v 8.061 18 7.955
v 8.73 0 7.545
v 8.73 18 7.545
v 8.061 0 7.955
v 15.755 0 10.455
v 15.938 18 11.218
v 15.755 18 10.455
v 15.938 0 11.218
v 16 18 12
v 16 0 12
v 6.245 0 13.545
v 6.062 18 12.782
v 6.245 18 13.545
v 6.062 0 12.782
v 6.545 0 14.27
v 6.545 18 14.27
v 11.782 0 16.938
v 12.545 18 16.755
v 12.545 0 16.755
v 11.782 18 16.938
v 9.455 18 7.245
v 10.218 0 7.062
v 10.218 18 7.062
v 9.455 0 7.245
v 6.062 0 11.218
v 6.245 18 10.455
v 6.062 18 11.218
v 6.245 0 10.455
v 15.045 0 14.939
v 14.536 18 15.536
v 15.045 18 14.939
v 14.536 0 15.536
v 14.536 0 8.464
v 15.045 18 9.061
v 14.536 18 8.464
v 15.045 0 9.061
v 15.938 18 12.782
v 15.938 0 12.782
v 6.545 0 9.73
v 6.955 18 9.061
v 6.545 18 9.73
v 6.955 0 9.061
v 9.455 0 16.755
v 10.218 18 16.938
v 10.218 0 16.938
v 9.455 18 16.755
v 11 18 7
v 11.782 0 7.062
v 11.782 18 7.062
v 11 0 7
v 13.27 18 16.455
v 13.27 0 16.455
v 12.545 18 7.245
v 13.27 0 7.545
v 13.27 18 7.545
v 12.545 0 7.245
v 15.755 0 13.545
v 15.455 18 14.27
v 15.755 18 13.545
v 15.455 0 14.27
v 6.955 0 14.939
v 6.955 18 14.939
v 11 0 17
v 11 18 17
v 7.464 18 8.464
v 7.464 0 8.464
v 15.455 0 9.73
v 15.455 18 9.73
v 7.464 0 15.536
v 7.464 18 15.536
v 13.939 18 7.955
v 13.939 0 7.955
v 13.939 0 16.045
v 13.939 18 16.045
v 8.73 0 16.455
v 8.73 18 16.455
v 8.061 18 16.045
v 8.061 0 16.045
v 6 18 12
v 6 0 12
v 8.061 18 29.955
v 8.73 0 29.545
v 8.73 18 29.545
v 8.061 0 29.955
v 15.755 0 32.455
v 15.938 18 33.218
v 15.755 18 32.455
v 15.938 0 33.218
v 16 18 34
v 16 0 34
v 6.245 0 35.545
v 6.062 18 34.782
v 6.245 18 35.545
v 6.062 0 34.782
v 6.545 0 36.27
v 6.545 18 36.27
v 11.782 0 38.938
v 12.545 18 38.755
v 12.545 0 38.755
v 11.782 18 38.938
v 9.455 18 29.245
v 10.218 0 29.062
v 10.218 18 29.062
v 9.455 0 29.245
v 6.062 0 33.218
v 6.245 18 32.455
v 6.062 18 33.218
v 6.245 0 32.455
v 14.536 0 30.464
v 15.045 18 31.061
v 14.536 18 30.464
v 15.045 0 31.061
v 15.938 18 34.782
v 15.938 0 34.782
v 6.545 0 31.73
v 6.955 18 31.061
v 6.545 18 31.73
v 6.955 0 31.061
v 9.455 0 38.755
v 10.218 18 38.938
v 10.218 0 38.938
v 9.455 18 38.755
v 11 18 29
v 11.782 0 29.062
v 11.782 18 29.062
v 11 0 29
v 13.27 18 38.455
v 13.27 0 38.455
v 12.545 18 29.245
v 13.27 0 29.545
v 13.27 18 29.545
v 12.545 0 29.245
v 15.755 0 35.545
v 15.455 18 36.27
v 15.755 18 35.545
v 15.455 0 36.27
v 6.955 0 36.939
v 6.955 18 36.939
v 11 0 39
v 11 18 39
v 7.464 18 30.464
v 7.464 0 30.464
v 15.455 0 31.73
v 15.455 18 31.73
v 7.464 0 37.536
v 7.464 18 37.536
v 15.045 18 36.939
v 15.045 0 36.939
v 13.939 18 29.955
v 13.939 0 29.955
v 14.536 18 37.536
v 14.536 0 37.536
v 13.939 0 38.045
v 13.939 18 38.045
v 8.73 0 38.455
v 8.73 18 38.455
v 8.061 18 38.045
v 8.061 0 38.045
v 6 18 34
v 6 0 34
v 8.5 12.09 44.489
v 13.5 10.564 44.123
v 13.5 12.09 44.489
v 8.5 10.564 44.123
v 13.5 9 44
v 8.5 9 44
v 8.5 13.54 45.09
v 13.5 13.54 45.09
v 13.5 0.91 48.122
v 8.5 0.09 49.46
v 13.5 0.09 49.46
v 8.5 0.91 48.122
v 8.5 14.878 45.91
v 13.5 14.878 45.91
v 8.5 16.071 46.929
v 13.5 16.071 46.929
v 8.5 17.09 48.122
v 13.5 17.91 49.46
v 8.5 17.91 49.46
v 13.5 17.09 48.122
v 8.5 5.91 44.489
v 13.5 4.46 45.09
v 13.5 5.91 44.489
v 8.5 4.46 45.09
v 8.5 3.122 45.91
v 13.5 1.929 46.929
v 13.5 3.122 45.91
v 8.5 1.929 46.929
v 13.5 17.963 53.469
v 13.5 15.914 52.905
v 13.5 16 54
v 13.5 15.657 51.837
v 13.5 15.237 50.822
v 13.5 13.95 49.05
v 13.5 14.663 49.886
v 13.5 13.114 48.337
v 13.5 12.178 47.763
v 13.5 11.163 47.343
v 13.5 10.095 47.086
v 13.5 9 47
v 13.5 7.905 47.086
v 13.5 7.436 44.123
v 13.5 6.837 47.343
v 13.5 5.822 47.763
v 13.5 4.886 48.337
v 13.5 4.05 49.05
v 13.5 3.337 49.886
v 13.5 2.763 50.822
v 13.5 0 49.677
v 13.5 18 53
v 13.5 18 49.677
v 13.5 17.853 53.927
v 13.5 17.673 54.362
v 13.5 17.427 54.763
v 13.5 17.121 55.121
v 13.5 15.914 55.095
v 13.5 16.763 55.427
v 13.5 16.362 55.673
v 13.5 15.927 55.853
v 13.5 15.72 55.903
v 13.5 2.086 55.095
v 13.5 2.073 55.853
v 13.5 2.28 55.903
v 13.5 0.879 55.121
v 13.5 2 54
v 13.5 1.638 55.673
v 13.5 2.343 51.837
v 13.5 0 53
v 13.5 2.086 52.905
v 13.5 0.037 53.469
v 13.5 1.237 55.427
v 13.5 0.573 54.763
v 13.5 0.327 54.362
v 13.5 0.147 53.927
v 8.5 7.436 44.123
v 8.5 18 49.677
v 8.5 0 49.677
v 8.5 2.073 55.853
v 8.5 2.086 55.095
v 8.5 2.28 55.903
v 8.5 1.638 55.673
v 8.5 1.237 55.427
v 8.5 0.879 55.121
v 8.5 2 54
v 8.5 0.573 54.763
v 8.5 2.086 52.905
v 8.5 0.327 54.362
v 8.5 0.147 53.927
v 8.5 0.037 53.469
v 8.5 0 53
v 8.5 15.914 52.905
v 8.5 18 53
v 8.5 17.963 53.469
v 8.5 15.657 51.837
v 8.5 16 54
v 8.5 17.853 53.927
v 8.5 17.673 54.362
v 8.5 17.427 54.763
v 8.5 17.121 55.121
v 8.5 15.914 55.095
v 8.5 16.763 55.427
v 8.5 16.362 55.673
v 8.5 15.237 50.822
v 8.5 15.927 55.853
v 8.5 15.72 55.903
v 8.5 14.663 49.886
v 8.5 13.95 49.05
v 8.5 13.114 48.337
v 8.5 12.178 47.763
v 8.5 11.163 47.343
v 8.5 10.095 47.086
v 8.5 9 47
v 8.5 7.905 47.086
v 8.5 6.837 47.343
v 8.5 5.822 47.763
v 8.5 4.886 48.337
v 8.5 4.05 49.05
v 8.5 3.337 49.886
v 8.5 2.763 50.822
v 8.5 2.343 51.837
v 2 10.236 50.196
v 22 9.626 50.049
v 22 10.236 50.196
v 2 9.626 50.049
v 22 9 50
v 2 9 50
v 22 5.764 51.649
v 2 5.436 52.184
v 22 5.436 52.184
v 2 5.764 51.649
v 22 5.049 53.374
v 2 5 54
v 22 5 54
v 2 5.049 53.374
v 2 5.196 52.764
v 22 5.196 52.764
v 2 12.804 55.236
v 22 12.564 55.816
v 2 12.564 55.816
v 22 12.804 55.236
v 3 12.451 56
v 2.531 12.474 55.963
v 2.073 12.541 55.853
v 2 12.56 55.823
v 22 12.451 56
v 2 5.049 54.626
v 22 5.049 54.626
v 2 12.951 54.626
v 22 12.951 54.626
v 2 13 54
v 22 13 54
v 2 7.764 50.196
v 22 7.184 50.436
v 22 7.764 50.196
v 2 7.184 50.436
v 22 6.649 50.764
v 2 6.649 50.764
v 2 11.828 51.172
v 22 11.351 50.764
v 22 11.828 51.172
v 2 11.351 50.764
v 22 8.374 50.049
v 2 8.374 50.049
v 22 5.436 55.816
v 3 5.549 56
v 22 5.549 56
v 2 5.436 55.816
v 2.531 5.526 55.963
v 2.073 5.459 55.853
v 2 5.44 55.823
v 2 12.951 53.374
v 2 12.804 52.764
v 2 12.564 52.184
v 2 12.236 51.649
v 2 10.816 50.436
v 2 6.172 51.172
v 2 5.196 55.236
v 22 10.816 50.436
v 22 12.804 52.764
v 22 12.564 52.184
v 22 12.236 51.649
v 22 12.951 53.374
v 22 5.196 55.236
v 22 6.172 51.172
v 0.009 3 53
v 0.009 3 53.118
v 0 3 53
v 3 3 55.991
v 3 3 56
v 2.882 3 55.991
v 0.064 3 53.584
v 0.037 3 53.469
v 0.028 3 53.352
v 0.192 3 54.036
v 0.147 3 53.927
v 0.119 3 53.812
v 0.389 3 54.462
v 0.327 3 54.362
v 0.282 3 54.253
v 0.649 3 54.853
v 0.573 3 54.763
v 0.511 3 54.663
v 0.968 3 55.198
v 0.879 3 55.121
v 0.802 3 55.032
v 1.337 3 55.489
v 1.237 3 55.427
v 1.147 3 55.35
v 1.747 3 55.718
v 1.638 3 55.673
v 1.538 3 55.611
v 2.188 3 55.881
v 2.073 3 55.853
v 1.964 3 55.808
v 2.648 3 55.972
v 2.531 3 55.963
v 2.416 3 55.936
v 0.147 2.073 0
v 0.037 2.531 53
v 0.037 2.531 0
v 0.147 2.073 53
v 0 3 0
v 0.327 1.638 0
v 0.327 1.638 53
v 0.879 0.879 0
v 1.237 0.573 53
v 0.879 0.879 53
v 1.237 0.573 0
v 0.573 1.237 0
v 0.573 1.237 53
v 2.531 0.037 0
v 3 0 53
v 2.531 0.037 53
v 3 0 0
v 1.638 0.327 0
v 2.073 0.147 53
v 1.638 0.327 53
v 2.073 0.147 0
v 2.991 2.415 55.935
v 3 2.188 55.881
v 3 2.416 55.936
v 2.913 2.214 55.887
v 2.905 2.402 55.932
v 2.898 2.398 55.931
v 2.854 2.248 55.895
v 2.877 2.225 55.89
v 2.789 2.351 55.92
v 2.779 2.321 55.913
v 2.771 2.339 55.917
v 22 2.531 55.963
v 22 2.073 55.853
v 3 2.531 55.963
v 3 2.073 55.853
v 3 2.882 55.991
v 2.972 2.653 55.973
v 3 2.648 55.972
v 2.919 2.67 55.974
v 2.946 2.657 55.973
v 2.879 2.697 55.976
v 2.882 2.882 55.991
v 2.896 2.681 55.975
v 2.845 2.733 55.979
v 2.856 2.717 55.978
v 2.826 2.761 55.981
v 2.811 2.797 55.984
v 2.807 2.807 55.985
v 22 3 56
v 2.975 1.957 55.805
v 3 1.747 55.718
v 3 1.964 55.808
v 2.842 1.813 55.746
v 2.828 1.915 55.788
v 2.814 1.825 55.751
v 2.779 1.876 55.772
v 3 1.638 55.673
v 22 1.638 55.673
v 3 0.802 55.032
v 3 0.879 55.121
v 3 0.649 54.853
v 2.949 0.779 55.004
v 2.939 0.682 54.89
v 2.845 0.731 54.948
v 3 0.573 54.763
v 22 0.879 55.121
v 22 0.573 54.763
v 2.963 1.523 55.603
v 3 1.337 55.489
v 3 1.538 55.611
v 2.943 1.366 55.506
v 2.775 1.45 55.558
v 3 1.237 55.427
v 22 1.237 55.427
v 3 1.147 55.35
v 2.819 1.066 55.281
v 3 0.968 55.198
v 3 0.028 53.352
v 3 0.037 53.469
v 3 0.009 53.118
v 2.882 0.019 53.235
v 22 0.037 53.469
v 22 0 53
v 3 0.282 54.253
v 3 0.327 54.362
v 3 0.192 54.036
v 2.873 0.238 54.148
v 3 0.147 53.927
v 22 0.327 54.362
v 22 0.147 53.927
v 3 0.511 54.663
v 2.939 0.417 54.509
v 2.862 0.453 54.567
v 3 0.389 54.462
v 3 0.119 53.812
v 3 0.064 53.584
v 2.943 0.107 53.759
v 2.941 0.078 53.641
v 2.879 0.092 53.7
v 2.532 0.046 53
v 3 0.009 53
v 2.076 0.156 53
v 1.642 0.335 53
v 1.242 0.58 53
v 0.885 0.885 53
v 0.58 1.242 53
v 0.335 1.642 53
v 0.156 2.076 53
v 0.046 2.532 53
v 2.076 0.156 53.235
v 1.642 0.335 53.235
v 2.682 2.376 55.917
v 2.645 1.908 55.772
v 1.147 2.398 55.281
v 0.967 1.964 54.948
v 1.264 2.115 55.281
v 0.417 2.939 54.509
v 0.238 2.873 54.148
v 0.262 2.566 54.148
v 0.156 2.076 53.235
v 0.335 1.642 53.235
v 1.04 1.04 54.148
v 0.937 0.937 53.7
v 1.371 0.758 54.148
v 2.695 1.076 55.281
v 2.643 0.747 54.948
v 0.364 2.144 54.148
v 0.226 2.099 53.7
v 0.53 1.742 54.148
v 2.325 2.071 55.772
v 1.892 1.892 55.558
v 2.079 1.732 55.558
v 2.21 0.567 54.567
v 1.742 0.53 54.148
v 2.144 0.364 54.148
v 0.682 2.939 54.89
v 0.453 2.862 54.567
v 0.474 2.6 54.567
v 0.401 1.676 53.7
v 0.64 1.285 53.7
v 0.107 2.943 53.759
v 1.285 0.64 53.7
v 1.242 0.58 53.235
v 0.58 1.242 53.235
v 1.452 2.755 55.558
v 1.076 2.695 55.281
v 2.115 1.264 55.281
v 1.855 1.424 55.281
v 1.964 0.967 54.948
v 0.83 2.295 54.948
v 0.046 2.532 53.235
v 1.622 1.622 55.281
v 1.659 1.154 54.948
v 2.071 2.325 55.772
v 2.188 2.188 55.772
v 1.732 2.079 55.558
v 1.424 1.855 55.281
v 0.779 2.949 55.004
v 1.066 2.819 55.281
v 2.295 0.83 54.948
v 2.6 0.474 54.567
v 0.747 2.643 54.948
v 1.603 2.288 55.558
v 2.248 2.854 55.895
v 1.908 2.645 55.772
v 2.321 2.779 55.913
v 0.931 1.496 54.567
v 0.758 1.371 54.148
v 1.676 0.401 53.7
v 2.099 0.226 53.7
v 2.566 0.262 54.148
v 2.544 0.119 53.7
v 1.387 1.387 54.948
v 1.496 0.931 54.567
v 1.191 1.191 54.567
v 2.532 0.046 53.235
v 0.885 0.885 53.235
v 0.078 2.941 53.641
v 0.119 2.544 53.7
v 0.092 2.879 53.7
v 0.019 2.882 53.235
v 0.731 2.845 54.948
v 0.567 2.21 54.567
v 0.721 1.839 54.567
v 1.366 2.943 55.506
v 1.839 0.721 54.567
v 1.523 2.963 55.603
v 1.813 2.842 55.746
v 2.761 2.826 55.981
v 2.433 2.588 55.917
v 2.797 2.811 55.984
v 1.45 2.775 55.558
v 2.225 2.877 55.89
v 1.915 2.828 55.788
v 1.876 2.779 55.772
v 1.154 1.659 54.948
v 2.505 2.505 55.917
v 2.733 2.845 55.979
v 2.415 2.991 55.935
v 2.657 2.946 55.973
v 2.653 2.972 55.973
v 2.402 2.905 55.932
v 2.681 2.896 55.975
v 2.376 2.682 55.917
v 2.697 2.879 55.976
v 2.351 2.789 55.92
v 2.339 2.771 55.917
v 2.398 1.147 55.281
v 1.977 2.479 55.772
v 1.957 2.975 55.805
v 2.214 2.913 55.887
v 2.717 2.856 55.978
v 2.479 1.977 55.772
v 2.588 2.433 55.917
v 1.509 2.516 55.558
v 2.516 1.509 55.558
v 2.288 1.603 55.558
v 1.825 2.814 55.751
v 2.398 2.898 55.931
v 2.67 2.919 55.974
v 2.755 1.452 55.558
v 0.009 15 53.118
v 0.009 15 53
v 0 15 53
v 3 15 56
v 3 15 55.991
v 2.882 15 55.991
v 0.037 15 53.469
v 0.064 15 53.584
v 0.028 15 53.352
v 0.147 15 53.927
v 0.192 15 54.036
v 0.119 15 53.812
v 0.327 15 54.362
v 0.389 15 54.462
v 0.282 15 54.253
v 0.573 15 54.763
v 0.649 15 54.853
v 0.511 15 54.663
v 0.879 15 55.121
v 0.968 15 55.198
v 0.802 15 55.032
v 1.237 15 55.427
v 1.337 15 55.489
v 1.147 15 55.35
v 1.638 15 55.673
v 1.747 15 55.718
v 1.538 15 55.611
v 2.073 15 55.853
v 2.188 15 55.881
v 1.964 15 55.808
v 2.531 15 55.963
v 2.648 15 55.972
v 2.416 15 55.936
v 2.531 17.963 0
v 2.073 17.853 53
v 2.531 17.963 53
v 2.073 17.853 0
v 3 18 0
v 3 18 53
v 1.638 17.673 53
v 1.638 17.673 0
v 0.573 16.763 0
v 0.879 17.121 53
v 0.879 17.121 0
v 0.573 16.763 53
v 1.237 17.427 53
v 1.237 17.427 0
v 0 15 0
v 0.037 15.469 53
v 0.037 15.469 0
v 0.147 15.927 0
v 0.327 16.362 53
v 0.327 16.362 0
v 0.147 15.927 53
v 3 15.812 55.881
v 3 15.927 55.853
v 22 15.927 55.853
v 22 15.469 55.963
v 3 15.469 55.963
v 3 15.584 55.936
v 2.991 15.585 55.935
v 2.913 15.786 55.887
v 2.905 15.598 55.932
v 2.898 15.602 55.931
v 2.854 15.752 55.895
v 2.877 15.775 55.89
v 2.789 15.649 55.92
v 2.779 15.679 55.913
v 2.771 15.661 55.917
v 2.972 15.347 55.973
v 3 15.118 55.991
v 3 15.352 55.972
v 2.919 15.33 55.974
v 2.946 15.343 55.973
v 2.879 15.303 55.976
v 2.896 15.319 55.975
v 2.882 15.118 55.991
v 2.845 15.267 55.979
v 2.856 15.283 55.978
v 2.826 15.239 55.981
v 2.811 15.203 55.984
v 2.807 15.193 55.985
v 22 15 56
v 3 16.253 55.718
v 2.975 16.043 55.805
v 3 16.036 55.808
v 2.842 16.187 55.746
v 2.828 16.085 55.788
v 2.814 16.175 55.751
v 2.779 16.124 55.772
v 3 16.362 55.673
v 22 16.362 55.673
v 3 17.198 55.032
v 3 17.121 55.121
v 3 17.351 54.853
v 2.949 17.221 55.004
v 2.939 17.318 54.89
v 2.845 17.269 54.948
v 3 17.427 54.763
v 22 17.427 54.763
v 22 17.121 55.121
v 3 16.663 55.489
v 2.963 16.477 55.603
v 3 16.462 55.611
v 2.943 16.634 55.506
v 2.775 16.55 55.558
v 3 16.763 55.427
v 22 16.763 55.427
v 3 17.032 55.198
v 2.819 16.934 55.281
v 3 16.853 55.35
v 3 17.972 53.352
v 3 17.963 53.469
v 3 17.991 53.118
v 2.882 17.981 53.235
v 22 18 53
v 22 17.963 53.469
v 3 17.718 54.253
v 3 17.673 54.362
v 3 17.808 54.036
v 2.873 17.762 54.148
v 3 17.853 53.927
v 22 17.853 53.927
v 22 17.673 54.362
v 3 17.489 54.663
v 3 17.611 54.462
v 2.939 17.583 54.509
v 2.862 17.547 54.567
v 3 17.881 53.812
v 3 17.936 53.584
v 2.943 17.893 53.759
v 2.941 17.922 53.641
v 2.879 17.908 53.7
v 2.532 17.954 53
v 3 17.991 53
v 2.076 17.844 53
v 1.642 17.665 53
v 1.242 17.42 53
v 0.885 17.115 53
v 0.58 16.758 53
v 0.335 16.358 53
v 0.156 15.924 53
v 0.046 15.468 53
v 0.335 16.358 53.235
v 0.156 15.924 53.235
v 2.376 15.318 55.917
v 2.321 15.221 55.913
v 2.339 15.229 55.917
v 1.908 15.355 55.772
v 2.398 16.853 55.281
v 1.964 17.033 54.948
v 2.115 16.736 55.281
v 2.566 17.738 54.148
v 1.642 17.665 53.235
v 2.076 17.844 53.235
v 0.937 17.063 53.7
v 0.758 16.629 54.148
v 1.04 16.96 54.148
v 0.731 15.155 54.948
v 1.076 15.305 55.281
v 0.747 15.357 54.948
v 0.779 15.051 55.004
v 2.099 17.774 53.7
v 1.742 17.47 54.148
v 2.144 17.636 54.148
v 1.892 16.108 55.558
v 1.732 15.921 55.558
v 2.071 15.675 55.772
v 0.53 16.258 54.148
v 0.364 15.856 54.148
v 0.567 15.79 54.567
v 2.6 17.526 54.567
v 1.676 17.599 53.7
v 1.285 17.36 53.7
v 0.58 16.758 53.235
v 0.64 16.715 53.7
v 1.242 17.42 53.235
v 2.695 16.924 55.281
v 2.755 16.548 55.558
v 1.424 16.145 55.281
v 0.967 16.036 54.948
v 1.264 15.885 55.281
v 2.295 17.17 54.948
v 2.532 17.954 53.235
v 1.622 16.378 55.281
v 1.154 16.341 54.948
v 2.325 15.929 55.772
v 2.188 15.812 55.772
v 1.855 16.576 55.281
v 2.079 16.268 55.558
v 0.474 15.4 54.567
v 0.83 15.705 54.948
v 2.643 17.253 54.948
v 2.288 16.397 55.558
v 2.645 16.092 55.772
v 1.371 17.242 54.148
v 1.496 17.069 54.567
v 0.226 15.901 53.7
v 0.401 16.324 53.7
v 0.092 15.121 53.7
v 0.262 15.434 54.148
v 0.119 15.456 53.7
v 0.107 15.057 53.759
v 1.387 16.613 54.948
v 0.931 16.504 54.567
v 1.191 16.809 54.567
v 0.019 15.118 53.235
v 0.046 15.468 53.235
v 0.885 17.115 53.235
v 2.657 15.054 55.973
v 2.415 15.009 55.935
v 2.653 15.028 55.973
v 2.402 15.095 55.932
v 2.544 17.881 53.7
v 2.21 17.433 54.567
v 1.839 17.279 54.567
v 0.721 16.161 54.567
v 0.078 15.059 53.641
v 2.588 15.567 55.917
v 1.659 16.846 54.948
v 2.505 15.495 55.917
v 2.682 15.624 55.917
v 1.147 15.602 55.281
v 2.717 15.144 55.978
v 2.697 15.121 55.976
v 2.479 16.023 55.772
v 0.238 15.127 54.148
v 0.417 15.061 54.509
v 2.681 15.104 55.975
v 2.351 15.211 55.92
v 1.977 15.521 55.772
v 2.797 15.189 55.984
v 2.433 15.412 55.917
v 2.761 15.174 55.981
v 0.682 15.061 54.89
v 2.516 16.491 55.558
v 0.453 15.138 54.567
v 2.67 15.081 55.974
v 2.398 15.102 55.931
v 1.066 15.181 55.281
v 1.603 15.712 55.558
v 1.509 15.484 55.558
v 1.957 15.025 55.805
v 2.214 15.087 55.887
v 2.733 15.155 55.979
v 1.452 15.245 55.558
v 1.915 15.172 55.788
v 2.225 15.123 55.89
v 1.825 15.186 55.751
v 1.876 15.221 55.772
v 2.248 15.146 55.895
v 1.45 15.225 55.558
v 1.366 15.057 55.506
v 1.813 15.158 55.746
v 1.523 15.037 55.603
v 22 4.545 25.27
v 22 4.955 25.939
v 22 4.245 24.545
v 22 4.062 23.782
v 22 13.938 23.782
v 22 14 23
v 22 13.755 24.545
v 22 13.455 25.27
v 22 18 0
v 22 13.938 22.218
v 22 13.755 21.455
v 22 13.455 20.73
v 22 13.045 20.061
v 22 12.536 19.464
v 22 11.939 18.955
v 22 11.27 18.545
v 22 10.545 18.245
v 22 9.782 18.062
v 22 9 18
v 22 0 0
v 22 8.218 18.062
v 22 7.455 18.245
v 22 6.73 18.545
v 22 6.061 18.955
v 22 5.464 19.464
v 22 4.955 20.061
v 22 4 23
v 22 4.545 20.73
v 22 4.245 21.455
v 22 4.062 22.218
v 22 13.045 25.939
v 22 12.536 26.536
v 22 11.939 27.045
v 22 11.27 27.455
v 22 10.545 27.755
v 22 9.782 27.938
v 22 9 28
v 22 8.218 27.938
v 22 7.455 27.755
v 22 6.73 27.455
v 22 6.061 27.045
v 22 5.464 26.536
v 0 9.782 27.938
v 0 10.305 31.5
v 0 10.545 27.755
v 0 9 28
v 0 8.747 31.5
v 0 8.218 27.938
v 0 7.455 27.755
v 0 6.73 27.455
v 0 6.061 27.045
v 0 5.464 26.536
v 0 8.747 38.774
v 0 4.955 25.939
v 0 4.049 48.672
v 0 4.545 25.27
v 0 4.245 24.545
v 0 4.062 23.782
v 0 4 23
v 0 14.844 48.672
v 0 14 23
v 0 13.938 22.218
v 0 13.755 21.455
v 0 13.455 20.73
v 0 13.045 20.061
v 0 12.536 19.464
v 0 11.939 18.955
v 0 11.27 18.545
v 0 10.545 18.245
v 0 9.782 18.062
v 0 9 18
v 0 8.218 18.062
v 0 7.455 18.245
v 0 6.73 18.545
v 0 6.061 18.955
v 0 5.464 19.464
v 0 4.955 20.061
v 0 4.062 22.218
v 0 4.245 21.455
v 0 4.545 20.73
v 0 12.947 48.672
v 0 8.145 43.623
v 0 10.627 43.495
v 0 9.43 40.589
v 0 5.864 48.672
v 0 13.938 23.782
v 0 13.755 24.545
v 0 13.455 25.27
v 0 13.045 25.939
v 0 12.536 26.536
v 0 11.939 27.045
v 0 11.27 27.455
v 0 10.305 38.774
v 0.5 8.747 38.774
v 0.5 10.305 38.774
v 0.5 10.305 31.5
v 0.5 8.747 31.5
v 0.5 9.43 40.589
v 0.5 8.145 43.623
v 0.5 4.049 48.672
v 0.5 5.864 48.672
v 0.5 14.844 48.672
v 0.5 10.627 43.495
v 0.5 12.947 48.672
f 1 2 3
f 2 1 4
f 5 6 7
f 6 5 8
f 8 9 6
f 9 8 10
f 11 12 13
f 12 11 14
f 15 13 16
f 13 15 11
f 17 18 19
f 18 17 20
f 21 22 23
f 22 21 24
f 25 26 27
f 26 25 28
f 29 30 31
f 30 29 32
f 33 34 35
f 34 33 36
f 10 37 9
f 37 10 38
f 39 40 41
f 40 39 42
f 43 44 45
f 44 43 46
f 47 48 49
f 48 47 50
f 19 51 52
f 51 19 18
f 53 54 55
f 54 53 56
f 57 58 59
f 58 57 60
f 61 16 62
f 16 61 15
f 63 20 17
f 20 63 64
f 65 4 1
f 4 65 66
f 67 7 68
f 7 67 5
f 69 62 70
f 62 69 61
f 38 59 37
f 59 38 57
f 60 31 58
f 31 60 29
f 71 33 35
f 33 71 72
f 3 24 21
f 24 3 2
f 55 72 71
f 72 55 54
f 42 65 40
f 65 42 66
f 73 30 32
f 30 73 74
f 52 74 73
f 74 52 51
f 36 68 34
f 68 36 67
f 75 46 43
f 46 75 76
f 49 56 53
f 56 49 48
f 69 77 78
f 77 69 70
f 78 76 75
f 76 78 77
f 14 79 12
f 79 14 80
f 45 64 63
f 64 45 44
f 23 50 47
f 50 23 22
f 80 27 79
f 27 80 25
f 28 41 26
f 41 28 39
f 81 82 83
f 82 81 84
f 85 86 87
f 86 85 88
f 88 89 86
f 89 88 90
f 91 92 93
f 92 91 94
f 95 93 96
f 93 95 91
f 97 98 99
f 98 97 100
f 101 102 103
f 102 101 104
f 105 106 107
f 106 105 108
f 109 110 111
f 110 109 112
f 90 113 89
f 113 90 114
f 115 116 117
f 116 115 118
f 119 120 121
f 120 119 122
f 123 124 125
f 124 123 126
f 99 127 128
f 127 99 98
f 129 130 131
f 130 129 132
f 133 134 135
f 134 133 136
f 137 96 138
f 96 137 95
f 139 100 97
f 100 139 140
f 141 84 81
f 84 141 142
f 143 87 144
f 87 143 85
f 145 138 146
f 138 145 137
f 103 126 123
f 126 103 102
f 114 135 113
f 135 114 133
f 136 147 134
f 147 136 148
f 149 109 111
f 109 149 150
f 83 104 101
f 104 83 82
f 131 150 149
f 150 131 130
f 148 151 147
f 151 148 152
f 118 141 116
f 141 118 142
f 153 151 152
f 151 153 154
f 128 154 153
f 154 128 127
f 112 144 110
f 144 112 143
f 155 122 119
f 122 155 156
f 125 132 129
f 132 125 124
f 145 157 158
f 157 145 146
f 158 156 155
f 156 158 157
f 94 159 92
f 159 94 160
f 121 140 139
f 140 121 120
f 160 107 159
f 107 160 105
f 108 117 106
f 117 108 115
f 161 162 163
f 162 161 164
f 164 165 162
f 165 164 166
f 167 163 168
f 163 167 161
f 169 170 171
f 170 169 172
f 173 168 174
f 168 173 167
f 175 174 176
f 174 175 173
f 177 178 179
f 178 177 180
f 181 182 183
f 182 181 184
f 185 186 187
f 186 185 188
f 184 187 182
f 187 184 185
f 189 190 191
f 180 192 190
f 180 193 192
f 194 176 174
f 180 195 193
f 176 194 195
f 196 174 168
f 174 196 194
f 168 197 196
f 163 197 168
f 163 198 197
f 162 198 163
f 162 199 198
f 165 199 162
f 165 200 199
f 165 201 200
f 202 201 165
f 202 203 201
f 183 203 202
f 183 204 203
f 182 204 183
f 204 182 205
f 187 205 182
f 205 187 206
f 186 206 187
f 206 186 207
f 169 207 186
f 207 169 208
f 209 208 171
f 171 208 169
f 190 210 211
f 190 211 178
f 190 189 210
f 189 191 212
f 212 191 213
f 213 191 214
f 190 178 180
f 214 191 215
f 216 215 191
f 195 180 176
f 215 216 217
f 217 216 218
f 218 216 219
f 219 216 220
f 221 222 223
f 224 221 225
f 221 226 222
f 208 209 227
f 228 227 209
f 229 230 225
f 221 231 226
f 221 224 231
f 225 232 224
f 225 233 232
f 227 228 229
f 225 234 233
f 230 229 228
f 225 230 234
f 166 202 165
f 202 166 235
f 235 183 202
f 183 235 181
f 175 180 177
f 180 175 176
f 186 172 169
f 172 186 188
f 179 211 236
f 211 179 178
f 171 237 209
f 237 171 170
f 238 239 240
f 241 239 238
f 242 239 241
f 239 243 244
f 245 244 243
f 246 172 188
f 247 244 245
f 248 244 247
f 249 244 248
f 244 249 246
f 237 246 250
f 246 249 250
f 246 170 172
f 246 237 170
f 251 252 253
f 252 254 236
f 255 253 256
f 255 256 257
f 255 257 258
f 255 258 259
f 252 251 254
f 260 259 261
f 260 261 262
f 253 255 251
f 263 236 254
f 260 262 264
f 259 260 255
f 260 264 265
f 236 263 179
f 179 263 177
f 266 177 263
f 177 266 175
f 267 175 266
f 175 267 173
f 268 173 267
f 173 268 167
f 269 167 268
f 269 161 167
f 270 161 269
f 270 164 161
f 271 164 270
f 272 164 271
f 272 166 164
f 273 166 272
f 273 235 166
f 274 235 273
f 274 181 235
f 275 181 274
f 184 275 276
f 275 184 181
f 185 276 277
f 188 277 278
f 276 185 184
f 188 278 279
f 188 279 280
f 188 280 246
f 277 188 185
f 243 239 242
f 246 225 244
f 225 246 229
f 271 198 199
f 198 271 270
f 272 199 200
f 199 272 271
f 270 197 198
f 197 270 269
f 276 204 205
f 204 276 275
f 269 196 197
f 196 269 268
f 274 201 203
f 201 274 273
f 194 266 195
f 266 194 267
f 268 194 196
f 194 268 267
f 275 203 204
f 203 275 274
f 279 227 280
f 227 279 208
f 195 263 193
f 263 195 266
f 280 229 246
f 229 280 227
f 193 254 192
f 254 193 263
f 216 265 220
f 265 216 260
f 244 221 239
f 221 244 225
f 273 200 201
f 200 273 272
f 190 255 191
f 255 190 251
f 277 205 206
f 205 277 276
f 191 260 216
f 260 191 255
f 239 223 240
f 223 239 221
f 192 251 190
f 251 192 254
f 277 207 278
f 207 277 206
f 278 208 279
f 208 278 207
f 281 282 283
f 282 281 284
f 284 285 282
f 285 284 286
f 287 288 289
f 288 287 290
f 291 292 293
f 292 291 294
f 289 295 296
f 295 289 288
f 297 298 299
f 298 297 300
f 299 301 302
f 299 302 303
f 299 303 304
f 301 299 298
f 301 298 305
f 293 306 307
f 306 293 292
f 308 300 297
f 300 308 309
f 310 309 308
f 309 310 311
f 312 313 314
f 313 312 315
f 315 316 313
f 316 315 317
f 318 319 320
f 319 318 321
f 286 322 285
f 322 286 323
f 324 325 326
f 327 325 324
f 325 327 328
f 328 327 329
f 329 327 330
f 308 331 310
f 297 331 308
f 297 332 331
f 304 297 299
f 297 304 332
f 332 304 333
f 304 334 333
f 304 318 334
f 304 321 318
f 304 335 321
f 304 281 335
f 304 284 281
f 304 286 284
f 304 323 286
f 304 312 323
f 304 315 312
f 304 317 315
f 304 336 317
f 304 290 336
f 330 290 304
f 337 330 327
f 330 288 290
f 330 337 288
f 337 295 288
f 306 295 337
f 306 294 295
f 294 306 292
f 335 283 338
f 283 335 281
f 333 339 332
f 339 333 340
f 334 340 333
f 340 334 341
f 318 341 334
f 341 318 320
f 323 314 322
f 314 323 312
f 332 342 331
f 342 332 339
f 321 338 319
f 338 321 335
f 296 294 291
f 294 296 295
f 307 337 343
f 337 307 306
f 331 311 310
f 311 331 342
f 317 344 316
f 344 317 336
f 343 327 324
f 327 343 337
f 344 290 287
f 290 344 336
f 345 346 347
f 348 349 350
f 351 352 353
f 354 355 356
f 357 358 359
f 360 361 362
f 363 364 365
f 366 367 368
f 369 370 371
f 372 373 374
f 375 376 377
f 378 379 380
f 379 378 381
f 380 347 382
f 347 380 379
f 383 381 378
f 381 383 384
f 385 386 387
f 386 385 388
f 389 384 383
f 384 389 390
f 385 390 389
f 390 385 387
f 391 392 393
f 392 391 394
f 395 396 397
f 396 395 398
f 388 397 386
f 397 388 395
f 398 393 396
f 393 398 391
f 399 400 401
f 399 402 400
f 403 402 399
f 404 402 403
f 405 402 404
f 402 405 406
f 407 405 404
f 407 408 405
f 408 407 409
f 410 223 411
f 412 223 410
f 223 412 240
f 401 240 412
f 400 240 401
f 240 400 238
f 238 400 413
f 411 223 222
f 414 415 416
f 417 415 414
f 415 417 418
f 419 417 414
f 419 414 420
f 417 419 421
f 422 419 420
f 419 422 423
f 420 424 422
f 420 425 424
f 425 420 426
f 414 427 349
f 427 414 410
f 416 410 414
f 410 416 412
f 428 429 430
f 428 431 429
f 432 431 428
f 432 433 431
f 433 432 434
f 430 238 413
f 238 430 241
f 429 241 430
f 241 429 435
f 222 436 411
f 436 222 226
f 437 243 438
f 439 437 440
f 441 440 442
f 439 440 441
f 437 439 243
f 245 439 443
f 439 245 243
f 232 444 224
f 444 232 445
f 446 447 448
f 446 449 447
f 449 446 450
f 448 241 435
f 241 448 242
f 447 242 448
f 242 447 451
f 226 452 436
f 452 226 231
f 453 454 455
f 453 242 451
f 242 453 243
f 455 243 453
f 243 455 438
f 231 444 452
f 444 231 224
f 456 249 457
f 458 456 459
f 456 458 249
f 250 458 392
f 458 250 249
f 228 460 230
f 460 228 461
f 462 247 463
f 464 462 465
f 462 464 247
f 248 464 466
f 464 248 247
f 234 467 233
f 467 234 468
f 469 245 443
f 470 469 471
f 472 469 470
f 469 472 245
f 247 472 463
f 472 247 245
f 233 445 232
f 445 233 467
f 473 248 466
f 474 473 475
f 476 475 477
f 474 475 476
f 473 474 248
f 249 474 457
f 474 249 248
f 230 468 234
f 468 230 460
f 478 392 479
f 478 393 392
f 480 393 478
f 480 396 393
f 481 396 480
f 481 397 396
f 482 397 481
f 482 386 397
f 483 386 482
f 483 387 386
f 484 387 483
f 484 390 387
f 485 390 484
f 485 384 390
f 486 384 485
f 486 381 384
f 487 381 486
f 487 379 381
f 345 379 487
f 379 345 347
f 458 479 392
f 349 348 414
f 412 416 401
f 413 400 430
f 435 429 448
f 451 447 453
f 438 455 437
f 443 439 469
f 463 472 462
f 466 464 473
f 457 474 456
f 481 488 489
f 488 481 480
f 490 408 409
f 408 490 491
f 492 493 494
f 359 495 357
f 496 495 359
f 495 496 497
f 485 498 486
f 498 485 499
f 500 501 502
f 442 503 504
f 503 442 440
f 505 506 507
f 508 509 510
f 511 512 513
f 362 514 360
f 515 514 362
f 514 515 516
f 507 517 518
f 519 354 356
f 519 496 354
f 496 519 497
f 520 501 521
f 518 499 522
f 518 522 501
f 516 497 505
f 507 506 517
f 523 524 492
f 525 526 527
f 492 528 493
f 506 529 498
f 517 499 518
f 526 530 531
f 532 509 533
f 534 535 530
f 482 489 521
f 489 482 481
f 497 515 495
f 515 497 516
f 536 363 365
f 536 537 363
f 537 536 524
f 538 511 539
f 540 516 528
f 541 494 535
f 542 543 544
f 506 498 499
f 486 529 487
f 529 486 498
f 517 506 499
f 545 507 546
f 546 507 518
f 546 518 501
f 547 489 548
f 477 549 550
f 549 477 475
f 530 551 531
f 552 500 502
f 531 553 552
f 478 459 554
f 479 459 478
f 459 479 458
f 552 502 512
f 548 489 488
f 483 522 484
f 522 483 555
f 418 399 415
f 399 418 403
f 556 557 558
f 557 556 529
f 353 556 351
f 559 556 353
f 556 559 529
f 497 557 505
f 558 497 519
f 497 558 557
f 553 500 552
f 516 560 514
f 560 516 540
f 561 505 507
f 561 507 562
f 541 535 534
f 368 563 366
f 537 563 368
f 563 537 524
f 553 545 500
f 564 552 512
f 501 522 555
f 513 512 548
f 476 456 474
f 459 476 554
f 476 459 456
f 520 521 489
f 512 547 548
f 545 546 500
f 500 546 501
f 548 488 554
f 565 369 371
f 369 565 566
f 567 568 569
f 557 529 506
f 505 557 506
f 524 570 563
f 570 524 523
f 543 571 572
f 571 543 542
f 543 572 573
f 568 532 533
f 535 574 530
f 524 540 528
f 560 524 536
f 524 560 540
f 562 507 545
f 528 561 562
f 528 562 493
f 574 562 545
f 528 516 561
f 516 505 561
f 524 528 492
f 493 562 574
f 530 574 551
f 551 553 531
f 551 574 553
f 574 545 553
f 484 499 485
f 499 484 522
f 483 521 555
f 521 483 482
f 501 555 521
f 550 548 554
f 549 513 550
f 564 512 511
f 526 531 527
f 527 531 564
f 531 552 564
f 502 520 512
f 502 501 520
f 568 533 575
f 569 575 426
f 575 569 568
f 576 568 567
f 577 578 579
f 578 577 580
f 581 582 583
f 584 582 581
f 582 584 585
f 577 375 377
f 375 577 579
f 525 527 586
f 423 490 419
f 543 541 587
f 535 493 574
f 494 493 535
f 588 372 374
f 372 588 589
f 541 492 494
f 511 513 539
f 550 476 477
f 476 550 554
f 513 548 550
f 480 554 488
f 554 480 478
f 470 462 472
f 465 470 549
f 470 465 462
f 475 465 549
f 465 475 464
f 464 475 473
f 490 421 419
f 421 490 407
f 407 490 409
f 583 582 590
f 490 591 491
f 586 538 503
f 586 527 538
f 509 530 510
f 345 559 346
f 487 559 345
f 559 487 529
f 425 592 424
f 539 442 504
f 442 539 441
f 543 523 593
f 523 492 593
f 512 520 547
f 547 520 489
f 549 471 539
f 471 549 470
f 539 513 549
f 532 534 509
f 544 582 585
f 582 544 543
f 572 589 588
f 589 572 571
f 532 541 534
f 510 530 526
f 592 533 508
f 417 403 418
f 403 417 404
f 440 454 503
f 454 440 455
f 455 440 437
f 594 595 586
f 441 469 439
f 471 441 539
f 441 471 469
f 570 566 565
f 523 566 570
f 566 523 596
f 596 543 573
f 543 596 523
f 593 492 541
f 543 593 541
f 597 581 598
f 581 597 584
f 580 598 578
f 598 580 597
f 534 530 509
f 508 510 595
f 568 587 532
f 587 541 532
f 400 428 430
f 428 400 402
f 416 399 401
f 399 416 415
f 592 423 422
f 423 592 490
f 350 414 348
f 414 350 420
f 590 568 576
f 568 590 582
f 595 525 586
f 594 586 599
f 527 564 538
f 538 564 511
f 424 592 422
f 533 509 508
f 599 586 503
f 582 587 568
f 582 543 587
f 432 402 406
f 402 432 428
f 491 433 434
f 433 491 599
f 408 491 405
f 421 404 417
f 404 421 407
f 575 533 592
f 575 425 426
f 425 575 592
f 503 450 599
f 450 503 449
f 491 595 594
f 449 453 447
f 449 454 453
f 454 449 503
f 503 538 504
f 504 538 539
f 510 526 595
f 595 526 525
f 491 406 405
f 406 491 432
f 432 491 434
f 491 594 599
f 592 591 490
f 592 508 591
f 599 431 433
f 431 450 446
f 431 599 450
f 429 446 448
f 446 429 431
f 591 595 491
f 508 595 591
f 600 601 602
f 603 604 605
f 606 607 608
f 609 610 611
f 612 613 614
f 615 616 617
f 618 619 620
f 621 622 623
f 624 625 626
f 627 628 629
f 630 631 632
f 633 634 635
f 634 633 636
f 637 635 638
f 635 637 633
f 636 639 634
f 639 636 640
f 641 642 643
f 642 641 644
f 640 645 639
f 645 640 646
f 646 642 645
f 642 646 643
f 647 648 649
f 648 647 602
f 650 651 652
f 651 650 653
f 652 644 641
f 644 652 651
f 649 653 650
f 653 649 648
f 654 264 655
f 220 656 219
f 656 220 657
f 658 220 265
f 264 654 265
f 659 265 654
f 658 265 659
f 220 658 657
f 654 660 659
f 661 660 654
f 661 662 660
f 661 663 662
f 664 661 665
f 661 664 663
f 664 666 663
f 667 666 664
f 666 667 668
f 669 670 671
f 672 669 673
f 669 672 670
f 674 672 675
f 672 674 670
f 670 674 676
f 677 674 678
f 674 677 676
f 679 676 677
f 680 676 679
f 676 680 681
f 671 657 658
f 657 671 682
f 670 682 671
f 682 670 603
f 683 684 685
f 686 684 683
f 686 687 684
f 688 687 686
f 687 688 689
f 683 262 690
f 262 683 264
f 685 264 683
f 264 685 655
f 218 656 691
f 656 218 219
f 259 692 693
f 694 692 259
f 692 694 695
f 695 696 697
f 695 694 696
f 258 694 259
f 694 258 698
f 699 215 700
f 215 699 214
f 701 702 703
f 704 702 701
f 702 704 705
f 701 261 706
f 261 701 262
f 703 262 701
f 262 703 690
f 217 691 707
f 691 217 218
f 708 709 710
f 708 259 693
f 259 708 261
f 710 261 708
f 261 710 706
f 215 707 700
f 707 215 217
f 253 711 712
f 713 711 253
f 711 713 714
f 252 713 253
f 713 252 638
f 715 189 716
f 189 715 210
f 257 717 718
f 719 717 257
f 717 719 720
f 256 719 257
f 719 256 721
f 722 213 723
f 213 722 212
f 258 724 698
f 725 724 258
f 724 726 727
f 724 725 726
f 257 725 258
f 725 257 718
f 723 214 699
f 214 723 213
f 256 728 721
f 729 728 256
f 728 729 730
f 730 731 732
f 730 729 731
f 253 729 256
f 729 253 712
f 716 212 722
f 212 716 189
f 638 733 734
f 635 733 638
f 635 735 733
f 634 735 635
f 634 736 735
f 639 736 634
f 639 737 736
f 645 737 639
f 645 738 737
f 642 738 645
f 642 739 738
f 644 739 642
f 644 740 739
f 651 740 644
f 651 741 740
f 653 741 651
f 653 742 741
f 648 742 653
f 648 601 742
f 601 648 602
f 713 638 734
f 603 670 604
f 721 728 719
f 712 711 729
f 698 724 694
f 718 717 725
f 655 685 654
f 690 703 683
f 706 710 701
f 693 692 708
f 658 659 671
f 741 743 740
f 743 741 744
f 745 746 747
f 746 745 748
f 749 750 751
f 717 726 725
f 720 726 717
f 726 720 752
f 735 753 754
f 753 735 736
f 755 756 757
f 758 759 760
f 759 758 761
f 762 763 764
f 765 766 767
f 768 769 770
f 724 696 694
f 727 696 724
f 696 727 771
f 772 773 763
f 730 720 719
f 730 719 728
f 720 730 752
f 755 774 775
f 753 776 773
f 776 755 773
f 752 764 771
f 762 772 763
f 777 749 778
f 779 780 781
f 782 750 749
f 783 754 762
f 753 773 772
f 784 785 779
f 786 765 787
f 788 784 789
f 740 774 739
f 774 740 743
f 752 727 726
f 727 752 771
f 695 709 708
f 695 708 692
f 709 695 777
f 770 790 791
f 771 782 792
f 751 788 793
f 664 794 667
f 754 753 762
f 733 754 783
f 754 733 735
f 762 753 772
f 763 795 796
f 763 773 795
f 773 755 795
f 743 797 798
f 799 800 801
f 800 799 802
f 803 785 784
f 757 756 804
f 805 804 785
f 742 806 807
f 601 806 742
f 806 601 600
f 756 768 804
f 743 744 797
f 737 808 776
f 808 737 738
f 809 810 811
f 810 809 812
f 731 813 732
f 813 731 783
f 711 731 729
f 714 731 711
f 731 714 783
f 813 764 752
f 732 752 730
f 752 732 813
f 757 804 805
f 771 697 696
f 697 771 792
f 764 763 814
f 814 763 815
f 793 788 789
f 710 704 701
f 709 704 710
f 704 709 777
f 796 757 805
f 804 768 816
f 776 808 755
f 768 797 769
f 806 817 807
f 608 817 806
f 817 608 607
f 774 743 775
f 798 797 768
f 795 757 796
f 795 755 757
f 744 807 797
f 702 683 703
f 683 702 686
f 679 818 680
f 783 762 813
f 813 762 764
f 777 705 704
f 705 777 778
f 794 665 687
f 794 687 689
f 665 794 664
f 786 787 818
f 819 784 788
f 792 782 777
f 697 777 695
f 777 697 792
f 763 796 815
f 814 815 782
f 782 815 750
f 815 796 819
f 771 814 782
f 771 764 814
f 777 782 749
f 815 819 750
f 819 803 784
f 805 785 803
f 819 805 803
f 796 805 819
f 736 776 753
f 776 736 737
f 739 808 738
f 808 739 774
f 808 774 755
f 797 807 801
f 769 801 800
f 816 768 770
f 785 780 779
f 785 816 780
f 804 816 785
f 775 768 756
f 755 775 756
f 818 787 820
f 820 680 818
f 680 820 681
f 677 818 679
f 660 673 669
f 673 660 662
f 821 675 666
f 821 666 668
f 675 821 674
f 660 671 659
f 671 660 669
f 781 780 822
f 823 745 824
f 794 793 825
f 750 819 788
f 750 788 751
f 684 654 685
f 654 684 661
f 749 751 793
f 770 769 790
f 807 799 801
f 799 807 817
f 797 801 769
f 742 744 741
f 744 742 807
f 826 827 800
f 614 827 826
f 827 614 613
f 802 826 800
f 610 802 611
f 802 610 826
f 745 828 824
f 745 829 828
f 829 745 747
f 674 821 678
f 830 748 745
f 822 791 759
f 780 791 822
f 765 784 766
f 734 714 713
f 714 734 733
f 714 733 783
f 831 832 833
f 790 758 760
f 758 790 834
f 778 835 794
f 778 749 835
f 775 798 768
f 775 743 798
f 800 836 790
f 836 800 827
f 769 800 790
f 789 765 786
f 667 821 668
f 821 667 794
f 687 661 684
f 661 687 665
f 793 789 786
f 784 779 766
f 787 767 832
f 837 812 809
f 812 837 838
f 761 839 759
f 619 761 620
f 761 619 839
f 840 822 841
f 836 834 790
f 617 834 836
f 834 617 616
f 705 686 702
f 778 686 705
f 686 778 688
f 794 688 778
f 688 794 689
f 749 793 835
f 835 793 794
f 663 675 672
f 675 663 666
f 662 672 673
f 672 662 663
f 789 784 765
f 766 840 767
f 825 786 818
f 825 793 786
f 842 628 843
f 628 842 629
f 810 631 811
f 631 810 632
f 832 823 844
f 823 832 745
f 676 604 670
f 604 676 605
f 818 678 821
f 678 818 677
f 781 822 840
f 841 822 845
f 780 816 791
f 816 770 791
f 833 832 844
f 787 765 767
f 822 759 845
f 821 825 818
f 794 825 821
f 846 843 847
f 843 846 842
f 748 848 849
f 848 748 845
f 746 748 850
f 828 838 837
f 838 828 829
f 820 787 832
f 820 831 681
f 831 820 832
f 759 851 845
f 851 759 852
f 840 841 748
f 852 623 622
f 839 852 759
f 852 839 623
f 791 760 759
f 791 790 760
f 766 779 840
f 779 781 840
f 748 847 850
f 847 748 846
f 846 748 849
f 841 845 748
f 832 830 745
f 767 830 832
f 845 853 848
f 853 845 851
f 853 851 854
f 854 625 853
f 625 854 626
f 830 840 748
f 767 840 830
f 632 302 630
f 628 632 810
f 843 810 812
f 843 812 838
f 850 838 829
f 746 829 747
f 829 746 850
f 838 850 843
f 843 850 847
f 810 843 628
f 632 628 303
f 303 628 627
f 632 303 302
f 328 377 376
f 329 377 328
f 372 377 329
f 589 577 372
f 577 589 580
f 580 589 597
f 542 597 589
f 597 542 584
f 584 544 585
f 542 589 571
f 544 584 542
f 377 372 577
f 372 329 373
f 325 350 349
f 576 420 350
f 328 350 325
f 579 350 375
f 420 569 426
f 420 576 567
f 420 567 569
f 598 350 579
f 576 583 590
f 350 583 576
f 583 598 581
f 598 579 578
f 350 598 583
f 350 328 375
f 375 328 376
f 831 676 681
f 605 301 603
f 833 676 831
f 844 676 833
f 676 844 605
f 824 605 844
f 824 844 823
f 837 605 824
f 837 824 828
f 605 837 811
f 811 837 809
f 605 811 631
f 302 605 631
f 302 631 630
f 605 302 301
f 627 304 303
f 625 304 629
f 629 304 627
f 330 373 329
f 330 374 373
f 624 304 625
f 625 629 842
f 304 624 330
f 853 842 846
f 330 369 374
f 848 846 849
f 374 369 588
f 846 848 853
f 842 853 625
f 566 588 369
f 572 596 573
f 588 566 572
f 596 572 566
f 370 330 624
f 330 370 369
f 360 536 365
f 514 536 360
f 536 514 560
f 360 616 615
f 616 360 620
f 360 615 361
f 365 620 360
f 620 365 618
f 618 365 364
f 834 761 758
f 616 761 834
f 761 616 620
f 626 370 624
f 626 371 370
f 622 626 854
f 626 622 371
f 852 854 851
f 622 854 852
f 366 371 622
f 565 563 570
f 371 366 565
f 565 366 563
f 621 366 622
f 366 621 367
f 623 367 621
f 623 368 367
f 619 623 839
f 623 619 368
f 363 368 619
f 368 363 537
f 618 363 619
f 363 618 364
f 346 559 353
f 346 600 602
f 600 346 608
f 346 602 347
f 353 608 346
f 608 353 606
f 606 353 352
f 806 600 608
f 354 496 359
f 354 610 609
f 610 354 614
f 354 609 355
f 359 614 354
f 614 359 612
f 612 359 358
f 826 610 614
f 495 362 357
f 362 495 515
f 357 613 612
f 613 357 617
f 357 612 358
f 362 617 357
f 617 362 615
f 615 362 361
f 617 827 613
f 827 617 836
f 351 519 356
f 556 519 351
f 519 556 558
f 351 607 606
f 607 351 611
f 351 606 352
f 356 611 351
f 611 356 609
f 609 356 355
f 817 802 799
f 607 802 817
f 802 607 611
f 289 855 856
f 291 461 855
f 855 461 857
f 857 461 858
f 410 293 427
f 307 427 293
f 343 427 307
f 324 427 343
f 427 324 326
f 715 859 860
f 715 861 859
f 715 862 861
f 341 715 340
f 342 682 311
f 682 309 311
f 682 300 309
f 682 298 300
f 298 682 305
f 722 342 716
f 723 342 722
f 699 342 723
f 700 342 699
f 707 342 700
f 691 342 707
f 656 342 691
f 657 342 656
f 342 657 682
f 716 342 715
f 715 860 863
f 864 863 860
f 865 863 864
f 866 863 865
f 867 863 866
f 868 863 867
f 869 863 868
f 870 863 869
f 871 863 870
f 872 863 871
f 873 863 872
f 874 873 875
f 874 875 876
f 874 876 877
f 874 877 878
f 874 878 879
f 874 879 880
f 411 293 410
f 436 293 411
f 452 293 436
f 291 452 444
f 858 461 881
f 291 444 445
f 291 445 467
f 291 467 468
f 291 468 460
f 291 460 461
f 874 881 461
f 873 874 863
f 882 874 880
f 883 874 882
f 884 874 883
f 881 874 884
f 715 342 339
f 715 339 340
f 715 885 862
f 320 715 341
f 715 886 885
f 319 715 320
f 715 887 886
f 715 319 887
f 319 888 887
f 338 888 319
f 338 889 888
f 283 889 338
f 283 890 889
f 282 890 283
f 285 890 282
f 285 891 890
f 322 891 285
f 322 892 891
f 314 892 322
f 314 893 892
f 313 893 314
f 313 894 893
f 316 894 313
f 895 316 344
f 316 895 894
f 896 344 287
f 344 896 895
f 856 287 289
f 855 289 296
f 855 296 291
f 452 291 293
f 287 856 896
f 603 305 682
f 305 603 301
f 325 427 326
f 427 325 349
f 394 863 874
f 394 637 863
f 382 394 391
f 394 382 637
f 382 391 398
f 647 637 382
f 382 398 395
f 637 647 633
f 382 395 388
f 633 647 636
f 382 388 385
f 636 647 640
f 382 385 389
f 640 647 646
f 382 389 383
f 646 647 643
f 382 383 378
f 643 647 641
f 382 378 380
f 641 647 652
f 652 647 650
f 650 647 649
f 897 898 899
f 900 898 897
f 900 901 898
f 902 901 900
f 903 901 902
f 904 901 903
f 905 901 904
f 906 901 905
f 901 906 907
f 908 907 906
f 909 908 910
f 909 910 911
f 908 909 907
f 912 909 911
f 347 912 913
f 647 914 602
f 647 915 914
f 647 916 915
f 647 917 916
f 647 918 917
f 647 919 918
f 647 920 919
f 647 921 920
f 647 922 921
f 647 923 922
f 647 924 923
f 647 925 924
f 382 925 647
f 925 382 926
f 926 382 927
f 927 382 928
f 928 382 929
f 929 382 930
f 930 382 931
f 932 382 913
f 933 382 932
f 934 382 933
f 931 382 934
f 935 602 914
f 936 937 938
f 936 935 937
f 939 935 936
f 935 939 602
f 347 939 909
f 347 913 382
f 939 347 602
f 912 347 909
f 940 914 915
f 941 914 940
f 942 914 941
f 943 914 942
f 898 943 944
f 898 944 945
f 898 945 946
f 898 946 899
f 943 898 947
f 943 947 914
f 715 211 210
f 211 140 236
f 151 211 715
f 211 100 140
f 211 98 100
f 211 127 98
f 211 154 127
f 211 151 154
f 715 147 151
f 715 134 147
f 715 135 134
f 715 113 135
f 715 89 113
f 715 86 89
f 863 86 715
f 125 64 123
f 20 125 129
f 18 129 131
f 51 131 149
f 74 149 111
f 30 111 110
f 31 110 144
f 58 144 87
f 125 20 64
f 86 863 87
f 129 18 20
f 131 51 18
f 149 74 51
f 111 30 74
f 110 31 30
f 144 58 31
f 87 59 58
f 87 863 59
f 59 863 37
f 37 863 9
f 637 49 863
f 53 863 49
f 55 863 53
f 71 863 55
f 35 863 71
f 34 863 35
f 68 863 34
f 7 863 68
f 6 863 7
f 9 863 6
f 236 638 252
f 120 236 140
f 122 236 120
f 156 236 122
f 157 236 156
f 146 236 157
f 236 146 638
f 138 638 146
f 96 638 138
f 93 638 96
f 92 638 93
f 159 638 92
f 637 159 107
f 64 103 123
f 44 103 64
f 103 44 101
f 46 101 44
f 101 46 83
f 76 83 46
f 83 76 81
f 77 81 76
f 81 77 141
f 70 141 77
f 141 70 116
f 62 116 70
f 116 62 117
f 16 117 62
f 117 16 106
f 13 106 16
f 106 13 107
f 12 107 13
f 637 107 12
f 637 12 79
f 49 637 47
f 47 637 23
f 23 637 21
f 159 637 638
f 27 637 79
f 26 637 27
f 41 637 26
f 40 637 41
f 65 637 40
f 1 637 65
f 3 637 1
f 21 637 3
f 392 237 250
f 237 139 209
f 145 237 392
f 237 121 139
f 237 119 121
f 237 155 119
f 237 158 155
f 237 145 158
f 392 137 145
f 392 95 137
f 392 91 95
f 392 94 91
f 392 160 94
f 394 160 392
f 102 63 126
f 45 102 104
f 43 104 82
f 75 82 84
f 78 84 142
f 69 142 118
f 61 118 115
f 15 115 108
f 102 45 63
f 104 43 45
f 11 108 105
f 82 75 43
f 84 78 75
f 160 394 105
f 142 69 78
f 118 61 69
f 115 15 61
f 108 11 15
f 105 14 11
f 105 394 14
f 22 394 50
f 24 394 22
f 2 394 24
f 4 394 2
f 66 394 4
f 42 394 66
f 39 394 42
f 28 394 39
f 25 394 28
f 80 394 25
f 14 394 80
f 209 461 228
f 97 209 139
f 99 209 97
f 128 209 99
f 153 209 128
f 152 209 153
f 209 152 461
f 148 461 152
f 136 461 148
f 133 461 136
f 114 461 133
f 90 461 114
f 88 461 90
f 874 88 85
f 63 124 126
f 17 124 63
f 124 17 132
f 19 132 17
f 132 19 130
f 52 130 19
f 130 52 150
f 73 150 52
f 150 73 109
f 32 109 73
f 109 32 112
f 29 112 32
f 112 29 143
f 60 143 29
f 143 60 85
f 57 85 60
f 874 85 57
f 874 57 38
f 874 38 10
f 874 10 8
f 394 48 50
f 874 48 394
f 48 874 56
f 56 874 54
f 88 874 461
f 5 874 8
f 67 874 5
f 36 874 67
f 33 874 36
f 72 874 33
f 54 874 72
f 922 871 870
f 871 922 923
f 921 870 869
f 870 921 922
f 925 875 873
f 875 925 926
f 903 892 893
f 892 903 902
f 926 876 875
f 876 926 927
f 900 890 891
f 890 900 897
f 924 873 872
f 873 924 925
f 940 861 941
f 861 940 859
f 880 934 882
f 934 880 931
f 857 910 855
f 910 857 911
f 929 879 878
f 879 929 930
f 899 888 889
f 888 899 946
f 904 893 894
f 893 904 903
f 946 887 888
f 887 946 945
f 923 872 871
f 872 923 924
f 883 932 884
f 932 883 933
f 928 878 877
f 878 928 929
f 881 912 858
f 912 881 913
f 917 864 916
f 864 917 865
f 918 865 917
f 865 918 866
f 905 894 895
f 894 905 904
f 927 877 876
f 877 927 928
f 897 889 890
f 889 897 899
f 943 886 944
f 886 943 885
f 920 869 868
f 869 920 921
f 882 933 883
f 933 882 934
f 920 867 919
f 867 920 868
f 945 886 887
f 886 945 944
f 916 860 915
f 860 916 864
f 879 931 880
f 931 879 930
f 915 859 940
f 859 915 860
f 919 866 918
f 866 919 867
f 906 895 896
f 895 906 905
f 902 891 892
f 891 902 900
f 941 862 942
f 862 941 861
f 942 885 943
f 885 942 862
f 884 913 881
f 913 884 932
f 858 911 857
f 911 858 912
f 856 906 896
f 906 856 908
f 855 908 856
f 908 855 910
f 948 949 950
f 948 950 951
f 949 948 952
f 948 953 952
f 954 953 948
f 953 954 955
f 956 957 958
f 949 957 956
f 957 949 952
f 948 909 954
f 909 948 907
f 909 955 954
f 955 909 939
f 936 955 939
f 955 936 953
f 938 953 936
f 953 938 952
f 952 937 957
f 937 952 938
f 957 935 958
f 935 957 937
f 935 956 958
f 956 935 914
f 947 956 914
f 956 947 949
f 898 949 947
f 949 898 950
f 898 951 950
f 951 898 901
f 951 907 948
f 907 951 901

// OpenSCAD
H=56;
W=18;
L=22;

threaded_D=10;
plain_D=8;

fillet=3;

include <write/Write.scad>

module fillet(r, h, pos, rot)
{
	translate(pos)
	rotate(rot)
	translate([-r,-r,0])
		difference()
		{
			translate([0,0,-h/2])
				cube([r*2,r*2,h]);
			cylinder(r=r, h=h+2, center=true);
		}
}

module sphere_fillet(r,pos,rot)
{
	translate(pos)
	rotate(rot)
	translate([-r,-r,-r])
		difference()
		{
			cube([r*2,r*2,r*2]);
			sphere(r=r);
		}
}


module Y_corner()
{
	difference()
	{
		cube([L,W,H]);
		for(i=[0,1])
			translate([L/2, -1, 12+22*i])
				rotate([-90,0,0])
					cylinder(r=threaded_D/2, h=W+2);
		translate([-1, W/2, 23])
			rotate([0,90,0])
				cylinder(r=threaded_D/2, h=L+2);
		translate([0, W/2, 54])
			rotate([0,90,0])
			{
				translate([0,0,2])
					cylinder(r=plain_D/2, h=L);
				translate([0,0,L/2])
					difference()
					{
						cylinder(r=W/2+1, h=5, center=true);
						cylinder(r=W/2-2, h=7, center=true);
					}
				
			}
		for(i=[0,1])
		{
			fillet(fillet,H+2,[0,W*i,H/2],[0,0,180-90*i]);
			fillet(fillet,L+2,[L/2,W*i,H],[180*(i-1),-90,0]);
			sphere_fillet(fillet,[0,W*i,H],[0,0,180-90*i]);
		}
		fillet(fillet,W+2,[0,W/2,H],[90,-90,0]);
		translate([0,W/2,40])
			rotate([90,0,-90])
				scale([17/h,17/h,-1])
					write("Y",center=true);
	}
}


Y_corner($fn=40);
